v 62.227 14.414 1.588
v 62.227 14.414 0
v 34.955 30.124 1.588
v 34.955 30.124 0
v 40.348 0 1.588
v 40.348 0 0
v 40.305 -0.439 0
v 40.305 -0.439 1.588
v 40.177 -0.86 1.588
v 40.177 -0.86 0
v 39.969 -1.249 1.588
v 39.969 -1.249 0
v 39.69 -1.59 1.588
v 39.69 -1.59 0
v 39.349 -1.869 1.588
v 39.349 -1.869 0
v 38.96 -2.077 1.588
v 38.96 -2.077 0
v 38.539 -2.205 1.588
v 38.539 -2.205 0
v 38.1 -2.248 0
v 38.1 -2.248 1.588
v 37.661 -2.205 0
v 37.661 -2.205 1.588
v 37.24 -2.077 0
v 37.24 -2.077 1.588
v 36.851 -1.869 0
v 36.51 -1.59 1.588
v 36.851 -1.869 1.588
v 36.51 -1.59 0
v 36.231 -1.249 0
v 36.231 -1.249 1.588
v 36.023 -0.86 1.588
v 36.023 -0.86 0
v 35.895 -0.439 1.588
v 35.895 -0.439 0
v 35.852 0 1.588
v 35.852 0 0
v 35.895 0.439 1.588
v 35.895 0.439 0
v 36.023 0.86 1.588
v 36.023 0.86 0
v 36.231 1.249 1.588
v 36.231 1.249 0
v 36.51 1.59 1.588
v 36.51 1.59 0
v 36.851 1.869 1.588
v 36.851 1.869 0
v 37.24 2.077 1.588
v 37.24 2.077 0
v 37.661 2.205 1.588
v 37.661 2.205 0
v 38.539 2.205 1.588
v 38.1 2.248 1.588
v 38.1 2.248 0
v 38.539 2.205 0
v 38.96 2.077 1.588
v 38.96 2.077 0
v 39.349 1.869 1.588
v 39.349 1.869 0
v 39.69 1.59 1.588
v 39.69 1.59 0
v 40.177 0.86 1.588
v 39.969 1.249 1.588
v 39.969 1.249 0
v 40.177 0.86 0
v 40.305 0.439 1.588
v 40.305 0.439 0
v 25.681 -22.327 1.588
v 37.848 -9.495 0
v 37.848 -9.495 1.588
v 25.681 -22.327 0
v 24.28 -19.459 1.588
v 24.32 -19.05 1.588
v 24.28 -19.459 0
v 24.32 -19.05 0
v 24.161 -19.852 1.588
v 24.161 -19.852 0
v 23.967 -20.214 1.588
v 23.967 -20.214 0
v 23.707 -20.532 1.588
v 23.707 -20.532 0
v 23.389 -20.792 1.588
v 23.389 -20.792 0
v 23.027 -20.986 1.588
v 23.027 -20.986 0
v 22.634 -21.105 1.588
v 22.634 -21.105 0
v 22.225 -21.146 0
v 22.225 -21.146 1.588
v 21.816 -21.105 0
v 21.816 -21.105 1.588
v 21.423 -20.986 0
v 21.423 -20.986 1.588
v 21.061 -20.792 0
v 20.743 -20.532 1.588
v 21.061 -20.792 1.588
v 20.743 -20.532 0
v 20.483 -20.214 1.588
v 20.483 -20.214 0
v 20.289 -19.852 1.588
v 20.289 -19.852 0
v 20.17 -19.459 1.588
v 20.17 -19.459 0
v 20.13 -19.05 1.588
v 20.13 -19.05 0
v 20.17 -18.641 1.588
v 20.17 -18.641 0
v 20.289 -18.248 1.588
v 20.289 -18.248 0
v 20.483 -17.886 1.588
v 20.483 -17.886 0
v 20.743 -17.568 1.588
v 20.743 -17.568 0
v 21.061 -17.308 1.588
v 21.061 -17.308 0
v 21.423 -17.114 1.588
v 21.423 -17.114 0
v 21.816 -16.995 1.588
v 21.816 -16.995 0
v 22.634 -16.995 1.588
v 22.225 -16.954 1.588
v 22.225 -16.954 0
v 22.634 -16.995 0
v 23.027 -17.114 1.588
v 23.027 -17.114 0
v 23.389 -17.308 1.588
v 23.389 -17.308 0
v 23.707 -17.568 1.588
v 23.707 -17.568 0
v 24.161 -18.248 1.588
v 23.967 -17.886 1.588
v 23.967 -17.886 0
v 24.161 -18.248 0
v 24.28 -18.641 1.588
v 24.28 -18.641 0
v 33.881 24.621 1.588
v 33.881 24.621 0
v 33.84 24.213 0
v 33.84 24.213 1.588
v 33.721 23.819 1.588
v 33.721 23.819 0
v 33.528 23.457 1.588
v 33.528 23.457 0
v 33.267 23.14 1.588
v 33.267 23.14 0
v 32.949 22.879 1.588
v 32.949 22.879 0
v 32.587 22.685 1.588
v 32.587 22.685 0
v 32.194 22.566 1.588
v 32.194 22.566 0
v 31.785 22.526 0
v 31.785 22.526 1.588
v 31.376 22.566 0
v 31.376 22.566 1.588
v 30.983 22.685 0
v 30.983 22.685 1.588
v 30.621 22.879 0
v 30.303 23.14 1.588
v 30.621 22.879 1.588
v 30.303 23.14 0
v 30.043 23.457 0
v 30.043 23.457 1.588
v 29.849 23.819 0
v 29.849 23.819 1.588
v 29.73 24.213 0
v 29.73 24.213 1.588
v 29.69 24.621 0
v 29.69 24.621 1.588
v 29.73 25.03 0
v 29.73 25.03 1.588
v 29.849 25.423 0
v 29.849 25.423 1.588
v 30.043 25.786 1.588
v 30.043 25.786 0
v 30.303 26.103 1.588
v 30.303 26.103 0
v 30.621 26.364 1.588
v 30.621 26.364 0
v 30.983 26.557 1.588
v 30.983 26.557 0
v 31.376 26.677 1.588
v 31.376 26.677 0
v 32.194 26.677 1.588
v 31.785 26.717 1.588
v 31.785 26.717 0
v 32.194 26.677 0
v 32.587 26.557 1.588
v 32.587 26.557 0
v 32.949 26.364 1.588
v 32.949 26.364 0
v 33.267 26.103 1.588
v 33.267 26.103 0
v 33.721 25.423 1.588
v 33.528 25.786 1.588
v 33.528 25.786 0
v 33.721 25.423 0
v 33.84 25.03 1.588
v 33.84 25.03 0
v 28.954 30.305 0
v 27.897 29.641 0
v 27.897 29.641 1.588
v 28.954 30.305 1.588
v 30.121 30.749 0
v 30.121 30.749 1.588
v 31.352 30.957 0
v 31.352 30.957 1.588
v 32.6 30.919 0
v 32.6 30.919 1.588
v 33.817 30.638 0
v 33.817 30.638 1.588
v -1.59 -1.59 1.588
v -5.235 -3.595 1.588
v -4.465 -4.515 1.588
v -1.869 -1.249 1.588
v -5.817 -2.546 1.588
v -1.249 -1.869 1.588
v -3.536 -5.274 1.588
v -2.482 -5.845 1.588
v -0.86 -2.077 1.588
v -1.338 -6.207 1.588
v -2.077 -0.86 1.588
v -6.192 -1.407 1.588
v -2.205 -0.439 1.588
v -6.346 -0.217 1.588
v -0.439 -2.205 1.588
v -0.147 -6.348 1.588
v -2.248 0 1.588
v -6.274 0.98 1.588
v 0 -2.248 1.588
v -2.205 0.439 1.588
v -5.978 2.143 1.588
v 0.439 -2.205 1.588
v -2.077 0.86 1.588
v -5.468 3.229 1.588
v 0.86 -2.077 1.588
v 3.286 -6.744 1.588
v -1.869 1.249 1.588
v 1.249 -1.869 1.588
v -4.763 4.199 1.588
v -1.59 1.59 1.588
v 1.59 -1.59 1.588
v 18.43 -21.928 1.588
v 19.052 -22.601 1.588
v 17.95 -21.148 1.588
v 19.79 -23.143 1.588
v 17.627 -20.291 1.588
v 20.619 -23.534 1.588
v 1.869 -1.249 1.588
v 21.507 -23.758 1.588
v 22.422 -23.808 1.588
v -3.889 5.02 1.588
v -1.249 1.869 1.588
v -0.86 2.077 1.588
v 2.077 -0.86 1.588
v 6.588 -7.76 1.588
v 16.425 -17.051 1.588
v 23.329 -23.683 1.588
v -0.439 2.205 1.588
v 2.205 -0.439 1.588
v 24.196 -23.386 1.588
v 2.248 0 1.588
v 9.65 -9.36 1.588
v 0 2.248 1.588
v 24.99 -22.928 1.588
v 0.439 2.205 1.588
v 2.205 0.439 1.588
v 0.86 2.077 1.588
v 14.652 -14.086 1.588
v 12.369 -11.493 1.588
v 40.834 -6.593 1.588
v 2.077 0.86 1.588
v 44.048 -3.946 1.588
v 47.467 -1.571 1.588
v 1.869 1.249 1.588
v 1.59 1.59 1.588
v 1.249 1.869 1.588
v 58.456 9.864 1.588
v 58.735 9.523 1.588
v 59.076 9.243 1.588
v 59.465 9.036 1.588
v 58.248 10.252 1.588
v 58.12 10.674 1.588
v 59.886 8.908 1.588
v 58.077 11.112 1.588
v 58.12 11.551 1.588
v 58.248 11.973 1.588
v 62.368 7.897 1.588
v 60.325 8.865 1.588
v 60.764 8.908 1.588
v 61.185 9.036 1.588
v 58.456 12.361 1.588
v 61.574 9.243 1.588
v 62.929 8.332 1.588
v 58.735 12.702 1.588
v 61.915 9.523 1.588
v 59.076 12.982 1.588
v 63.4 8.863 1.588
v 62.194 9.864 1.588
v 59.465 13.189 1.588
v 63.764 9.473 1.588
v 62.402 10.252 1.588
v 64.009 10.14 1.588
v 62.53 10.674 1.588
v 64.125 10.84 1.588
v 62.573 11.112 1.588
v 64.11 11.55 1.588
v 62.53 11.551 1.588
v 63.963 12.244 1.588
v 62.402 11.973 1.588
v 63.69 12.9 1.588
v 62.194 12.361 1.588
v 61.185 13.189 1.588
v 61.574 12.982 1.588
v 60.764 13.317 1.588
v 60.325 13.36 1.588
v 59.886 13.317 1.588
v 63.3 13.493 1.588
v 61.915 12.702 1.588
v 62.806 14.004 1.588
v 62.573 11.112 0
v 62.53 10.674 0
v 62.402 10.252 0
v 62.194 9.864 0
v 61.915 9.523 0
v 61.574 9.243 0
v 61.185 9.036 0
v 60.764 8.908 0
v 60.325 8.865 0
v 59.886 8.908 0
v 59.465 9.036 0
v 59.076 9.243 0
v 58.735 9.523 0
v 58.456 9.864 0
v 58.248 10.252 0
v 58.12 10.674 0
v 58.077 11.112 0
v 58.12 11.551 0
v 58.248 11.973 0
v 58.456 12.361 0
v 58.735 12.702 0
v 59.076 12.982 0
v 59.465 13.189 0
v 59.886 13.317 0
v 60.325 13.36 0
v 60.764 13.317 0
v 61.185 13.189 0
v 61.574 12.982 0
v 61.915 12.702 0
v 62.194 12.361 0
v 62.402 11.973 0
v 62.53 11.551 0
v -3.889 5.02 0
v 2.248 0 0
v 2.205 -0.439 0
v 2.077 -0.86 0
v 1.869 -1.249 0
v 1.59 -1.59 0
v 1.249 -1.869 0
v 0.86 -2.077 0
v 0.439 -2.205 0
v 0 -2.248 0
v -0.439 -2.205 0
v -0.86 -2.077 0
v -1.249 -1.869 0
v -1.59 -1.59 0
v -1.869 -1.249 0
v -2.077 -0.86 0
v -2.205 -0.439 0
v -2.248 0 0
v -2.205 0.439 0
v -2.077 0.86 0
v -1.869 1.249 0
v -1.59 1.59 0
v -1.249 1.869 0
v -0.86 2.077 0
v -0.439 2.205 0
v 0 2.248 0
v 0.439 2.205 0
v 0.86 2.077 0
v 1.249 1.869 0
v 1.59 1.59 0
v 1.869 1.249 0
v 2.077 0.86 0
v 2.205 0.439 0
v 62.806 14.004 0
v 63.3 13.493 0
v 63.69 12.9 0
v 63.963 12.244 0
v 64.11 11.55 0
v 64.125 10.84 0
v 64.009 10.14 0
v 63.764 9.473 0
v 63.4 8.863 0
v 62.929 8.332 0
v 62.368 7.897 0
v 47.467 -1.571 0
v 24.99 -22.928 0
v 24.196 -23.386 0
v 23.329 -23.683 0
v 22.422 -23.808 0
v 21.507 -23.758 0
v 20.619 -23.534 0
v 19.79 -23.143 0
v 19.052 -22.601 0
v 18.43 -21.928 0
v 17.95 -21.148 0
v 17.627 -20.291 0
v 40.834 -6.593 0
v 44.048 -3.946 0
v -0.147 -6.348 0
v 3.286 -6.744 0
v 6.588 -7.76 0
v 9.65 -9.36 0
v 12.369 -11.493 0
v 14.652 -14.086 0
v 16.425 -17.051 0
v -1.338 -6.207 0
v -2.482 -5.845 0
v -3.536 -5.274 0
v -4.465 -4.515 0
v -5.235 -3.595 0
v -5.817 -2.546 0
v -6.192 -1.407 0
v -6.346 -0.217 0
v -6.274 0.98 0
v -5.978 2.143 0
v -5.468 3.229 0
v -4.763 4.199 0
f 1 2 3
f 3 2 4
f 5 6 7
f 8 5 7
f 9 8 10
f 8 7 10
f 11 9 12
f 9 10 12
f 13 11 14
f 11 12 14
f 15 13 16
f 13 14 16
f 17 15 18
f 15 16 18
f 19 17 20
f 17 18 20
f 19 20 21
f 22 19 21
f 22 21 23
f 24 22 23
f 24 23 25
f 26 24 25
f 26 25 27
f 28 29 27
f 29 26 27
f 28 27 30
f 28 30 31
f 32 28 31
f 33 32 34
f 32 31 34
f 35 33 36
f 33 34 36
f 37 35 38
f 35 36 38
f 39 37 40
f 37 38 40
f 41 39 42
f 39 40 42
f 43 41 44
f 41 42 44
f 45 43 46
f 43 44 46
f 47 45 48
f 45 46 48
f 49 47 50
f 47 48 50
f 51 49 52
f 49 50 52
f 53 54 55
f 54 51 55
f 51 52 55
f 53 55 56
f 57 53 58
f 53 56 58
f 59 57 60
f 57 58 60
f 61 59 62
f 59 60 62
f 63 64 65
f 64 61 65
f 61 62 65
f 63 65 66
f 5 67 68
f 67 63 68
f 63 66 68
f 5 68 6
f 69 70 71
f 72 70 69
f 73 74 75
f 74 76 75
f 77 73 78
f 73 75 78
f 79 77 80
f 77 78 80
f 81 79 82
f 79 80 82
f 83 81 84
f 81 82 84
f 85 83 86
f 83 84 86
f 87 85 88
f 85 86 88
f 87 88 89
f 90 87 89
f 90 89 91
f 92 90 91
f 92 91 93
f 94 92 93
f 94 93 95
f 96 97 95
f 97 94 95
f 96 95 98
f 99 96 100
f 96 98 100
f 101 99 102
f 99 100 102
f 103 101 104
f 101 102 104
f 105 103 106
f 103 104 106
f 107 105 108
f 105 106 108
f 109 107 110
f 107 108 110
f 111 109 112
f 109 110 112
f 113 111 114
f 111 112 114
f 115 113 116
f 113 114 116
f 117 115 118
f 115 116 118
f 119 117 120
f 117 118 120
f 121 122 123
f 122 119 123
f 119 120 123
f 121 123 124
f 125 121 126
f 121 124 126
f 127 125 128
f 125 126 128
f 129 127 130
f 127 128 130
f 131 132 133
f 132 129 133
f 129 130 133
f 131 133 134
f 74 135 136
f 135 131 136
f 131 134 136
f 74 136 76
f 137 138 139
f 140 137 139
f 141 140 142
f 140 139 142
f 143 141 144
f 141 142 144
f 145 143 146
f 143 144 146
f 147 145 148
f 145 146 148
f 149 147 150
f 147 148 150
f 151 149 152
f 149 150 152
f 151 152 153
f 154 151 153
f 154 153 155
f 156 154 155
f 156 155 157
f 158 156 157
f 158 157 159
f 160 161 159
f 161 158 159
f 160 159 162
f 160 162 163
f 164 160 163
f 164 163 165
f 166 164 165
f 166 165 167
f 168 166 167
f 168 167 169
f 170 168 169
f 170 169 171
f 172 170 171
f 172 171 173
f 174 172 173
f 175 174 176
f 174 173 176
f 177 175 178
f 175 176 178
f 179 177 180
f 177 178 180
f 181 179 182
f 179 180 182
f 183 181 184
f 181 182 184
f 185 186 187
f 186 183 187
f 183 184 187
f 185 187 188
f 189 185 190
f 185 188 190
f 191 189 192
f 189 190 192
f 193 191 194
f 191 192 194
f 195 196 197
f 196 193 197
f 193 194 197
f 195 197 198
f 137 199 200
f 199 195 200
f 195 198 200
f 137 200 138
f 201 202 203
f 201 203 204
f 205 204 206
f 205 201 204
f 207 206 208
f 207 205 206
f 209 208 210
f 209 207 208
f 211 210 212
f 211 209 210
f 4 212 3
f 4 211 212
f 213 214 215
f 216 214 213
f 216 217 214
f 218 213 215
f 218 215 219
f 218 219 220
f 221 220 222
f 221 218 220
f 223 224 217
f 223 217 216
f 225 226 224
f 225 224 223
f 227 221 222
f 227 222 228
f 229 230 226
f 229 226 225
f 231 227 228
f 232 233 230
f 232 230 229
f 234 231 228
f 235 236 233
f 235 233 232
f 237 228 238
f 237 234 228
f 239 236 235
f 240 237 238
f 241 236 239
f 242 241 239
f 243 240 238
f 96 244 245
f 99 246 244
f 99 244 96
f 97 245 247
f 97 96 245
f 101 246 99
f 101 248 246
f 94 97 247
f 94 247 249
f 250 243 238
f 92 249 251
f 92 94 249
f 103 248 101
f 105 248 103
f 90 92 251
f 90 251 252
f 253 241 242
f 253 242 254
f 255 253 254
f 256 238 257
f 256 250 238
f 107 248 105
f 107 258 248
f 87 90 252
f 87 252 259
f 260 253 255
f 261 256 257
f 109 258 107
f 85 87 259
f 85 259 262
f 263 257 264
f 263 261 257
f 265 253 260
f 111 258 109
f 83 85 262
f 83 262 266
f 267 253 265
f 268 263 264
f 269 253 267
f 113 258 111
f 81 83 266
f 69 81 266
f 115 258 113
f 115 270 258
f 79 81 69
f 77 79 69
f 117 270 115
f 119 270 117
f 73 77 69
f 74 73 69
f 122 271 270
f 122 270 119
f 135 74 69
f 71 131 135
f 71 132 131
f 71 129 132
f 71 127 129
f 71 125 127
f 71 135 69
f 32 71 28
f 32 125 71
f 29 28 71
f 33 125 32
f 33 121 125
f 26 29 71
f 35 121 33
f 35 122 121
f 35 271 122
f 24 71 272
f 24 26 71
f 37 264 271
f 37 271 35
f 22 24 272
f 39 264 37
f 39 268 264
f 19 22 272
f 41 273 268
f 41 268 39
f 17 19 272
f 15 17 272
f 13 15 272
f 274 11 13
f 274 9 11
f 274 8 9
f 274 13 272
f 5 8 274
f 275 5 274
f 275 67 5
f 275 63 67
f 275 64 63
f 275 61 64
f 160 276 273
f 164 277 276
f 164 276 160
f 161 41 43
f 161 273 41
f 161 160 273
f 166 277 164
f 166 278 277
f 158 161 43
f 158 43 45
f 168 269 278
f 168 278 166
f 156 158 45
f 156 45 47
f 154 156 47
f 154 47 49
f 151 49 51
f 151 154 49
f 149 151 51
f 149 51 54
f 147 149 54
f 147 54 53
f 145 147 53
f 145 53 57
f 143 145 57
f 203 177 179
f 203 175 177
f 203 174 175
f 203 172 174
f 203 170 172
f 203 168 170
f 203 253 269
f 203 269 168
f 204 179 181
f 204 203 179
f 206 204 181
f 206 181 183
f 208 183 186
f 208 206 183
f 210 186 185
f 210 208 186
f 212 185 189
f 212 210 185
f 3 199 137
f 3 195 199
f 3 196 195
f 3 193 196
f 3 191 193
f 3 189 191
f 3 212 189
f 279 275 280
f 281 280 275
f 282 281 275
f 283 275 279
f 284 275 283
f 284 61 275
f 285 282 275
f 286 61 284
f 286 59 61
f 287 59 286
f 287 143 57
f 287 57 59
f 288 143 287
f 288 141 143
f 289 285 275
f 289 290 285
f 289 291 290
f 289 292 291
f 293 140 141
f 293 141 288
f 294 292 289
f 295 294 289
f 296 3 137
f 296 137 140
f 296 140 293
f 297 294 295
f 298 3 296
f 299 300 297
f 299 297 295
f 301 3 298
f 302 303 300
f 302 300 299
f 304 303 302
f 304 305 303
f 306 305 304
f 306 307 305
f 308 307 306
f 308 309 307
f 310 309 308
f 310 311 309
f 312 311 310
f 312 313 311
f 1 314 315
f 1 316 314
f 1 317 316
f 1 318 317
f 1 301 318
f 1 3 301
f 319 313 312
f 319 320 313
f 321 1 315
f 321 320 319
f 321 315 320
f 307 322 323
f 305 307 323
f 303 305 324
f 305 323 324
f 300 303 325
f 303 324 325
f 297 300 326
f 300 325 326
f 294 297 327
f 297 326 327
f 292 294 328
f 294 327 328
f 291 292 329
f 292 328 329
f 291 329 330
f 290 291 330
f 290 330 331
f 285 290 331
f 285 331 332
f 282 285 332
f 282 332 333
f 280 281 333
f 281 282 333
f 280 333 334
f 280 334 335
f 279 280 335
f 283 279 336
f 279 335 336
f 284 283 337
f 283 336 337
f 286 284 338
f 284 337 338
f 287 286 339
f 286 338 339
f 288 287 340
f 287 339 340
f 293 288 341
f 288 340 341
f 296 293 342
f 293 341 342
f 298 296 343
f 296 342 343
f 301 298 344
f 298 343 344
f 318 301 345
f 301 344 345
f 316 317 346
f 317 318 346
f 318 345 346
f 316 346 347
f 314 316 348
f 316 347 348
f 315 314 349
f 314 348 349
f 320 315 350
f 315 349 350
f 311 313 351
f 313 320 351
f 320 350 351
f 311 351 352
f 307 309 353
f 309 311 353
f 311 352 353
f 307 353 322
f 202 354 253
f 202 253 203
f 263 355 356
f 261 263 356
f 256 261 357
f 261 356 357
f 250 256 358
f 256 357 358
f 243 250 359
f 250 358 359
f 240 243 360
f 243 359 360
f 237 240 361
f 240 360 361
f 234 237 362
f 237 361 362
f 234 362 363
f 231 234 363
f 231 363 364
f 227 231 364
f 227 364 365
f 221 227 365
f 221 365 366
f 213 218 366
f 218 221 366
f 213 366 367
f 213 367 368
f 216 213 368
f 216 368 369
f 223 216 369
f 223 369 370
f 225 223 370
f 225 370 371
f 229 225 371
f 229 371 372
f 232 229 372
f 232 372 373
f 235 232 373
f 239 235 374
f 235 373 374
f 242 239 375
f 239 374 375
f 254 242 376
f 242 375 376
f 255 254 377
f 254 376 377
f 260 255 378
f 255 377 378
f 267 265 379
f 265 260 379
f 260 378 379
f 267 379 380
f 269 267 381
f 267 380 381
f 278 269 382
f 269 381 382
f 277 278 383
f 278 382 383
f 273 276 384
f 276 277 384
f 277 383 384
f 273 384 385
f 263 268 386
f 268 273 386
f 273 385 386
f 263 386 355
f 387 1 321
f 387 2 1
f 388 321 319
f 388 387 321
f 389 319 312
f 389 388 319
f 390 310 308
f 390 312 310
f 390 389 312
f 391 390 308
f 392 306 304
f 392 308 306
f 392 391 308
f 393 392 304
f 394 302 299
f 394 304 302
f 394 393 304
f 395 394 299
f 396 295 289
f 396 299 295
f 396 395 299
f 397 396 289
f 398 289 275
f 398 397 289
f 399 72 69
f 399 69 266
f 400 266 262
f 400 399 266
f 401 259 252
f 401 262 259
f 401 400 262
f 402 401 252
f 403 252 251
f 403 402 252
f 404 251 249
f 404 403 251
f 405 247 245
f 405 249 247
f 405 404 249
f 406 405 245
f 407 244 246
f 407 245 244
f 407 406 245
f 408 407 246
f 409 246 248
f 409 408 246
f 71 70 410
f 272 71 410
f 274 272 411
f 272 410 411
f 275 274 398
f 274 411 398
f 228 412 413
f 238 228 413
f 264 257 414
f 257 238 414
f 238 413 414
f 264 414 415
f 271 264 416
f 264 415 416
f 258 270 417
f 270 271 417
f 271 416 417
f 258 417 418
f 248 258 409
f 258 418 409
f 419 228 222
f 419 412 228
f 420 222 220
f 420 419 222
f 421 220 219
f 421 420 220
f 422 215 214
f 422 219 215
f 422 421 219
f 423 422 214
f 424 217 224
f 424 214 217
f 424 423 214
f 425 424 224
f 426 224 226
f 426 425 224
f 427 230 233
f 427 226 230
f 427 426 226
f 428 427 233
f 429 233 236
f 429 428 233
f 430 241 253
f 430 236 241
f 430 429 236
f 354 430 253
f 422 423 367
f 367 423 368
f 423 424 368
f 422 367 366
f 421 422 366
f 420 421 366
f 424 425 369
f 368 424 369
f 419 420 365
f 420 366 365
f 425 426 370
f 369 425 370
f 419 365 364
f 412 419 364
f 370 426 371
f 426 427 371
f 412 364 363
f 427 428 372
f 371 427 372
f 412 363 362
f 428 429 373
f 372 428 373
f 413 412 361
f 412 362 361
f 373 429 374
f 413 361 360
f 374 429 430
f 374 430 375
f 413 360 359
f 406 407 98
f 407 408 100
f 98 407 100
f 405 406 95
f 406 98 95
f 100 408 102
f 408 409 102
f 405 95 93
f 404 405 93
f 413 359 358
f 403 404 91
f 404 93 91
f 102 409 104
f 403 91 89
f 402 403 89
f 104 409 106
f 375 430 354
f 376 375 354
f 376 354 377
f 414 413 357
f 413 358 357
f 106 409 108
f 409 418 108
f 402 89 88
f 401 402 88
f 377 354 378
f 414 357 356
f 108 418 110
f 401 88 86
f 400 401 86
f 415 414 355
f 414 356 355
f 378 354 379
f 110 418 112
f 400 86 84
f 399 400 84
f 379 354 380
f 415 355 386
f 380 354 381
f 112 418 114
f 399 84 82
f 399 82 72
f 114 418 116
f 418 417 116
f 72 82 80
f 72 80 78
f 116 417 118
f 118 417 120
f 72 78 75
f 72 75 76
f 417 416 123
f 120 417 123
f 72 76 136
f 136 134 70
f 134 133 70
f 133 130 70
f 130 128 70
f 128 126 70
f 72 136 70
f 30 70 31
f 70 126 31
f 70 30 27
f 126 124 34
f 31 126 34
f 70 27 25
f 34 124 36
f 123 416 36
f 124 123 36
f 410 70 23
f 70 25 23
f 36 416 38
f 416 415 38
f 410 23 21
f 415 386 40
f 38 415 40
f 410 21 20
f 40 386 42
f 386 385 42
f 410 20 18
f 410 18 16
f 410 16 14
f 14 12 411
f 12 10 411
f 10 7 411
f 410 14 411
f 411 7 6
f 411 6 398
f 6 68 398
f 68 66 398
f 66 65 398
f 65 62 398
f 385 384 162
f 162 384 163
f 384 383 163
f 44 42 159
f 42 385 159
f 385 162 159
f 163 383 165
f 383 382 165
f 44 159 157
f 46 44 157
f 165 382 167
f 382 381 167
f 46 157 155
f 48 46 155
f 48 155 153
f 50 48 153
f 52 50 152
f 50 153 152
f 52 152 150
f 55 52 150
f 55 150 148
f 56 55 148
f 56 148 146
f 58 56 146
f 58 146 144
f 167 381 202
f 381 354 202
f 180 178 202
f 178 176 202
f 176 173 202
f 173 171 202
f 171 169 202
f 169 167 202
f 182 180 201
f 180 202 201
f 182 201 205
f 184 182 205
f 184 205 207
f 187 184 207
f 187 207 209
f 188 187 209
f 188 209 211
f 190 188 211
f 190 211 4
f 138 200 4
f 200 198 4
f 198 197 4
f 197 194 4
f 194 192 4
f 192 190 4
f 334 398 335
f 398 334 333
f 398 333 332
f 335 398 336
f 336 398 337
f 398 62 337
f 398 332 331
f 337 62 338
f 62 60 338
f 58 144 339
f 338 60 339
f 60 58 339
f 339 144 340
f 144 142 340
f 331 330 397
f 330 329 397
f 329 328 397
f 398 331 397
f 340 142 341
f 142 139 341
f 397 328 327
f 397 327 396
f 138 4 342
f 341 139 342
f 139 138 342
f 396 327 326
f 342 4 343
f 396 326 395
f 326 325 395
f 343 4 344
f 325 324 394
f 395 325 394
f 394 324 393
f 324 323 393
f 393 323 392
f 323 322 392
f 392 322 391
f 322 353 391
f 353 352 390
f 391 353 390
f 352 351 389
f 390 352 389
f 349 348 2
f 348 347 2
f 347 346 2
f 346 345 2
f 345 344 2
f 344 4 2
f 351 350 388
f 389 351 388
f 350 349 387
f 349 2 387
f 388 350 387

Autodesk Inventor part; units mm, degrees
ref_plane "YZ Plane" through (0, 0, 0) normal (1, 0, 0) x (0, 1, 0)
ref_plane "XZ Plane" through (0, 0, 0) normal (0, 1, 0) x (-1, 0, 0)
ref_plane "XY Plane" through (0, 0, 0) normal (0, 0, 1) x (1, 0, 0)
sketch "Sketch1" plane through (0, 0, 0) normal (0, 0, 1) x (1, 0, 0)
  circle A0 centre (0, 0) radius 2.2479
  circle A1 centre (38.1, 0) radius 2.2479
  circle A2 centre (31.7852, 24.6214) radius 2.0955
  arc A3 (-3.8886, 5.0201) -> (-0.1468, -6.3483) centre (0, 0) ccw
  arc A4 (34.9548, 30.1237) -> (27.8966, 29.6414) centre (31.7852, 24.6214) ccw
  line L0 (-3.8886, 5.0201) -> (27.8966, 29.6414)
  line L1 (38.1, 0) -> (63.5, 0) construction
  circle A5 centre (22.225, -19.05) radius 2.0955
  arc A6 (17.6269, -20.2907) -> (25.681, -22.3268) centre (22.225, -19.05) ccw
  arc A7 (17.6269, -20.2907) -> (-0.1468, -6.3483) centre (-0.5827, -25.2041) ccw
  line L2 (37.8478, -9.4949) -> (25.681, -22.3268)
  circle A8 centre (60.325, 11.1125) radius 2.2479
  arc A9 (62.3683, 7.8968) -> (62.2268, 14.4139) centre (60.325, 11.1125) ccw
  line L3 (62.2268, 14.4139) -> (34.9548, 30.1237)
  line L4 (62.3683, 7.8968) -> (47.4674, -1.5713)
  arc A10 (47.4674, -1.5713) -> (37.8478, -9.4949) centre (74.7114, -44.448) ccw
  point P0 (42.1679, -4.9387)
  dimension "d0" = 4.4958
  dimension "d5" = 12.7
  dimension "d6" = 12.7
  dimension "d14" = 9.525
  dimension "d16" = 7.62
  dimension "d17" = 50.8
extrude "Extrusion1" add sketch "Sketch1" along normal blind 1.5875
properties part number "odom_pod" material "Acetal Resin, White"
